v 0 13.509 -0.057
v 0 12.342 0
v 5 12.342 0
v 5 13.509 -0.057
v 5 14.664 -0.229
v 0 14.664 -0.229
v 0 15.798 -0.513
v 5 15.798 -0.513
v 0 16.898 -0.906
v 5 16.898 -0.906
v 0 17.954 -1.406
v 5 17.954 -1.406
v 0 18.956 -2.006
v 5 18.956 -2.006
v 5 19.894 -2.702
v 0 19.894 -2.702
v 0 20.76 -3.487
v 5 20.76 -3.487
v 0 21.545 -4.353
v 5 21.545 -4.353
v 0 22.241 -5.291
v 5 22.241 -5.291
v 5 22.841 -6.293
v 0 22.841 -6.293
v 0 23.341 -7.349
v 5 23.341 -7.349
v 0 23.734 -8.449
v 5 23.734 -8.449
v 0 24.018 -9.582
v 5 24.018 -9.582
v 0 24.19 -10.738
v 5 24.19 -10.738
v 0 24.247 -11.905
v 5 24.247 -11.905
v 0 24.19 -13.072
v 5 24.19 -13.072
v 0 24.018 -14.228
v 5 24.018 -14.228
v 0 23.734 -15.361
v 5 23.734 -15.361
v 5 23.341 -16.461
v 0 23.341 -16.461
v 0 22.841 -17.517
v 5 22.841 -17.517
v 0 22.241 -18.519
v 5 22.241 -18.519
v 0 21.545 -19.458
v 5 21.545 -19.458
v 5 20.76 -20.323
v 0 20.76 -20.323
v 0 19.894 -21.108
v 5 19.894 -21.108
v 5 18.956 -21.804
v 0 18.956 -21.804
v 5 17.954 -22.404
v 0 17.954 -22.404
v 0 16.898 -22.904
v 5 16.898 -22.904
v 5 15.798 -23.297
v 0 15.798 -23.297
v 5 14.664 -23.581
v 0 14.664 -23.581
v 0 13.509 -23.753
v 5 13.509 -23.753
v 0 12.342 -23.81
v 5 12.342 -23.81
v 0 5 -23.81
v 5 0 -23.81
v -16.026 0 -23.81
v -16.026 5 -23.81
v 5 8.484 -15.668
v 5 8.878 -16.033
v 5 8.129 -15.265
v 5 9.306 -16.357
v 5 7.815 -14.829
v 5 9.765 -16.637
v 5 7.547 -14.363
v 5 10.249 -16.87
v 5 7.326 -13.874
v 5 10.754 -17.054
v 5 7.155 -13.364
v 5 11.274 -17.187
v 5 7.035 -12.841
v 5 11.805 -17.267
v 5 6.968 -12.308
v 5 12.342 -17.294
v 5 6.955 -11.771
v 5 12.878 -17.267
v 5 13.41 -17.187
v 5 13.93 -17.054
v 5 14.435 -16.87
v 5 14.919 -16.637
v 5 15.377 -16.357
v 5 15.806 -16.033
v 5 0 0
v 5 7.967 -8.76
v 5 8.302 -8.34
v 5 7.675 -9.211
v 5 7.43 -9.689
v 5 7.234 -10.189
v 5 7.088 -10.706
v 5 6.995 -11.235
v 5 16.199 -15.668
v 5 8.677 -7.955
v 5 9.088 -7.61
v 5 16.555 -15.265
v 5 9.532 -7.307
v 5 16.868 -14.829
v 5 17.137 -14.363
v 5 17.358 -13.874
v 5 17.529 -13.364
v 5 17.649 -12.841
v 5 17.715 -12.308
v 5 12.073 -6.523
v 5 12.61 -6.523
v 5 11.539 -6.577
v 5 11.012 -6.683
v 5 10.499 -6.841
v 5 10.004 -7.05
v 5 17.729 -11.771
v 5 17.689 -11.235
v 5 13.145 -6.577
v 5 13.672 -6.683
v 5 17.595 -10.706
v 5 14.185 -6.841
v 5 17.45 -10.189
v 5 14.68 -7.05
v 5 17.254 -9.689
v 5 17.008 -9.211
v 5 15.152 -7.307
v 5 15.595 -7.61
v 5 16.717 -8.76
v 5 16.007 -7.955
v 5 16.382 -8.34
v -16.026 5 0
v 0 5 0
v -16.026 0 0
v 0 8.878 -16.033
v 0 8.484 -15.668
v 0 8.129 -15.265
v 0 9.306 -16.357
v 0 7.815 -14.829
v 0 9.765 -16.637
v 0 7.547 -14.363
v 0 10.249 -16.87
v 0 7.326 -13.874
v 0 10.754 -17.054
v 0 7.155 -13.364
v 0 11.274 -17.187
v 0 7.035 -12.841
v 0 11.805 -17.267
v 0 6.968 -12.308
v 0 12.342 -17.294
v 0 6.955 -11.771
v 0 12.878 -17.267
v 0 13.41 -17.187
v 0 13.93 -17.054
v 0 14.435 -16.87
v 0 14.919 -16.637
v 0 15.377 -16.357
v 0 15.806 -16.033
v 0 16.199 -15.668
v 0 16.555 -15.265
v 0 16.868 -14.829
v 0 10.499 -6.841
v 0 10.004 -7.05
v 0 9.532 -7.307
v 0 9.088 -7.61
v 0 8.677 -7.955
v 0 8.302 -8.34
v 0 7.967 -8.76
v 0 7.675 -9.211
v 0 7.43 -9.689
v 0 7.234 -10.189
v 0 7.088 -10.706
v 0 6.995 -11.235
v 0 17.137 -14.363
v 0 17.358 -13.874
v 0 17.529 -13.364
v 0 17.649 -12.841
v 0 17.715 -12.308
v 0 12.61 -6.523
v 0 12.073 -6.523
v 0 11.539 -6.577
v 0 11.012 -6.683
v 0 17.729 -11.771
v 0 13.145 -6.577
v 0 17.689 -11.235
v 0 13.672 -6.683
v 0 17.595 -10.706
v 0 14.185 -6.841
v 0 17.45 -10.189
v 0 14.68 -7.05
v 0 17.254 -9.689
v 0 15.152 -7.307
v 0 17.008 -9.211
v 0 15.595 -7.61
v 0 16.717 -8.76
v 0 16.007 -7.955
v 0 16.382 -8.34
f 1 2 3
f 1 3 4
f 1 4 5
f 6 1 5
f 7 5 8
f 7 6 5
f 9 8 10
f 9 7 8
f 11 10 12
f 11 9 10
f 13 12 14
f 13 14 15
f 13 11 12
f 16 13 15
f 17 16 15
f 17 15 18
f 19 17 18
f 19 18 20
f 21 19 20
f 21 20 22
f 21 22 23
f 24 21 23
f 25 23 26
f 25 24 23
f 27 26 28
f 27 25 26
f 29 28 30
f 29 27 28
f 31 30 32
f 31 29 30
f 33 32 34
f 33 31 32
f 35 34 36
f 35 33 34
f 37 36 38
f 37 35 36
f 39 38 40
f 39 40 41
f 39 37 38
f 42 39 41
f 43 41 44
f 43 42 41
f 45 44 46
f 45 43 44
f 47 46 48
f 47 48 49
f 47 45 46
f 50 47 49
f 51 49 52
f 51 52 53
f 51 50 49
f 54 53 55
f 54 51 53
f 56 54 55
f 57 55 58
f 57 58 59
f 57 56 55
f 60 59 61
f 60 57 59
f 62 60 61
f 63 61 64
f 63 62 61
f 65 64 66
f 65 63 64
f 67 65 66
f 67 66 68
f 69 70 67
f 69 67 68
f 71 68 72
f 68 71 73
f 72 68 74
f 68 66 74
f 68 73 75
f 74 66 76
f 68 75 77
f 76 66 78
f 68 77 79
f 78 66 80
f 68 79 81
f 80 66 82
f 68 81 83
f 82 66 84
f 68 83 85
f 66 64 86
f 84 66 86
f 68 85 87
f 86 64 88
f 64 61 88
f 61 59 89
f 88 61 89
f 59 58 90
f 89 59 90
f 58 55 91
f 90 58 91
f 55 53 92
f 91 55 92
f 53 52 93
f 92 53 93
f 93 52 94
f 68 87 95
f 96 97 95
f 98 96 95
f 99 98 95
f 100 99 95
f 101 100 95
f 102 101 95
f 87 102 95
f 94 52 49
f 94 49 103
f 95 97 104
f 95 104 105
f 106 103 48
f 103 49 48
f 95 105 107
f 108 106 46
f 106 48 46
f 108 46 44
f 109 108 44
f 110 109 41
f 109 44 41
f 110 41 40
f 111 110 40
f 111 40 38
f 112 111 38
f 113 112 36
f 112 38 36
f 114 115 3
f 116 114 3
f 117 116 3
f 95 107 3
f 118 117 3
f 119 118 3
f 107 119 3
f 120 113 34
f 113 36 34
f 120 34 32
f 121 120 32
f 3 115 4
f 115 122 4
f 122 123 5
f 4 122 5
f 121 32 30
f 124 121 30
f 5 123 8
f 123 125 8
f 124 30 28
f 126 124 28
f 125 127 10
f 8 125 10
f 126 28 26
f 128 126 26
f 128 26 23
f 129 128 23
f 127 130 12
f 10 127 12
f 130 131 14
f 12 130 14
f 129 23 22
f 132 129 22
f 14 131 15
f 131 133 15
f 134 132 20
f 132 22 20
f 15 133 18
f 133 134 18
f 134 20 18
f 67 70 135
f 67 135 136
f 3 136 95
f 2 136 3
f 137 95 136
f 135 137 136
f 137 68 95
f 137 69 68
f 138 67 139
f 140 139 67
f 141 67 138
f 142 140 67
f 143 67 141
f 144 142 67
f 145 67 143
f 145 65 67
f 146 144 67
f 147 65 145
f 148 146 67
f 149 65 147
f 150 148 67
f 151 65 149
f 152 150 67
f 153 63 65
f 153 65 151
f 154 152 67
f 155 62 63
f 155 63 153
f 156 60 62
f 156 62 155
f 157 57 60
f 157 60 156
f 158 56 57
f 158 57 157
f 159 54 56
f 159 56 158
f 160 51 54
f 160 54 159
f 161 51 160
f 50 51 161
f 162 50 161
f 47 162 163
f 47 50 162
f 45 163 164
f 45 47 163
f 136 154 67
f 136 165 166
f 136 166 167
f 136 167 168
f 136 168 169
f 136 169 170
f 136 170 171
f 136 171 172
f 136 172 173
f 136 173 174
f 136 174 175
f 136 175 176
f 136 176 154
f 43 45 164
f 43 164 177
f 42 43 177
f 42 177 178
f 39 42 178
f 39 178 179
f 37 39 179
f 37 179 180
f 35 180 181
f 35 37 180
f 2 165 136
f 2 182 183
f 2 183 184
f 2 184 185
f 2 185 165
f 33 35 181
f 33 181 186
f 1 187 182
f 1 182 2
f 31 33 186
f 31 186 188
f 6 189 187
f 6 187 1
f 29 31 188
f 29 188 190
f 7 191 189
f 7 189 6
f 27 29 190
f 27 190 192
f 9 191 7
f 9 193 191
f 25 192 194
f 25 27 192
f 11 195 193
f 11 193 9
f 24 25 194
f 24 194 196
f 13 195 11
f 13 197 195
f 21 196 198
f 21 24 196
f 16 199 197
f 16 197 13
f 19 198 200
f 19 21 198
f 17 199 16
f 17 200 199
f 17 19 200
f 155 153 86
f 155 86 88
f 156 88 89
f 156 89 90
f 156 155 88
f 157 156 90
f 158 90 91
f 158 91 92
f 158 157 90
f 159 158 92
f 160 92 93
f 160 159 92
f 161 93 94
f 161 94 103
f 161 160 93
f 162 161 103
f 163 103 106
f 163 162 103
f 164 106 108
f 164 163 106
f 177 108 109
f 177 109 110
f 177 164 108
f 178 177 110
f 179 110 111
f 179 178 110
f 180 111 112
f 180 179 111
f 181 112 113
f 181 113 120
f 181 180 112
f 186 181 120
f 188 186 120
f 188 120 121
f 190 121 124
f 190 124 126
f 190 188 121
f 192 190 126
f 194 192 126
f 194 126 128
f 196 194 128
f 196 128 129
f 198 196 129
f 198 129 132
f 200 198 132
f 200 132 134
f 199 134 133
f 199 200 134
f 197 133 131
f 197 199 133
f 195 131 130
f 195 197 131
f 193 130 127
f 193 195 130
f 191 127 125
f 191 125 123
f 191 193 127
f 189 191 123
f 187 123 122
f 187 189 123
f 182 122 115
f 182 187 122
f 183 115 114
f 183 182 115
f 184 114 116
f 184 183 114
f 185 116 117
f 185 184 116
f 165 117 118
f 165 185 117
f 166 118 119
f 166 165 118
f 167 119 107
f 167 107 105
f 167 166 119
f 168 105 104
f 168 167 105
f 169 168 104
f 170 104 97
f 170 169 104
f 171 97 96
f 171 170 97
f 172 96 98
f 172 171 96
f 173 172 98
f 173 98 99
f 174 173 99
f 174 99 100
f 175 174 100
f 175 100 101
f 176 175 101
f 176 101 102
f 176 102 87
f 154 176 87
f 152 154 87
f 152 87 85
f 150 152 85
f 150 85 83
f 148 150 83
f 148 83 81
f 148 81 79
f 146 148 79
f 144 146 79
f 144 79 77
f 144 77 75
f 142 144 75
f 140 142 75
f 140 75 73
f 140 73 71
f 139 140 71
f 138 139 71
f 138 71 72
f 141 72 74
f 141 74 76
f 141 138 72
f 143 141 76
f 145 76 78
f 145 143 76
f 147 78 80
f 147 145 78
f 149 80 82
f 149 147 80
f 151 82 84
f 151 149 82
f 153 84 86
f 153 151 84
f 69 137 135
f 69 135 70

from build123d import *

# Parameters (mm, degrees)
SKETCH2_W           = 16.026033158
SKETCH2_H           = 23.810106406
BOSS_EXTRUDE1_DEPTH = 5
SKETCH3_R           = 5.388558838
BOSS_EXTRUDE2_DEPTH = 5


with BuildPart() as part:
    # Sketch2 → Boss-Extrude1 (new body)
    with BuildSketch(Plane(origin=(0, 0, 0), x_dir=(1, 0, 0), z_dir=(0, 1, 0))):
        with Locations((-8.013016579, 11.905053203)):
            Rectangle(SKETCH2_W, SKETCH2_H)
    extrude(amount=BOSS_EXTRUDE1_DEPTH)

    # Sketch3 → Boss-Extrude2 (add)
    with BuildSketch(Plane(origin=(0, 0, 0), x_dir=(0, 0, -1), z_dir=(1, 0, 0))):
        with BuildLine():
            Line((0, 0), (0, 12.341839421))
            ThreePointArc((0, 12.341839421), (11.905053203, 24.246892624), (23.810106406, 12.341839421))
            Line((23.810106406, 12.341839421), (23.810106406, 0))
            Line((23.810106406, 0), (0, 0))
        make_face()
        with Locations((11.905053203, 12.341839421)):
            Circle(SKETCH3_R, mode=Mode.SUBTRACT)
    extrude(amount=BOSS_EXTRUDE2_DEPTH)


solid = part.part
